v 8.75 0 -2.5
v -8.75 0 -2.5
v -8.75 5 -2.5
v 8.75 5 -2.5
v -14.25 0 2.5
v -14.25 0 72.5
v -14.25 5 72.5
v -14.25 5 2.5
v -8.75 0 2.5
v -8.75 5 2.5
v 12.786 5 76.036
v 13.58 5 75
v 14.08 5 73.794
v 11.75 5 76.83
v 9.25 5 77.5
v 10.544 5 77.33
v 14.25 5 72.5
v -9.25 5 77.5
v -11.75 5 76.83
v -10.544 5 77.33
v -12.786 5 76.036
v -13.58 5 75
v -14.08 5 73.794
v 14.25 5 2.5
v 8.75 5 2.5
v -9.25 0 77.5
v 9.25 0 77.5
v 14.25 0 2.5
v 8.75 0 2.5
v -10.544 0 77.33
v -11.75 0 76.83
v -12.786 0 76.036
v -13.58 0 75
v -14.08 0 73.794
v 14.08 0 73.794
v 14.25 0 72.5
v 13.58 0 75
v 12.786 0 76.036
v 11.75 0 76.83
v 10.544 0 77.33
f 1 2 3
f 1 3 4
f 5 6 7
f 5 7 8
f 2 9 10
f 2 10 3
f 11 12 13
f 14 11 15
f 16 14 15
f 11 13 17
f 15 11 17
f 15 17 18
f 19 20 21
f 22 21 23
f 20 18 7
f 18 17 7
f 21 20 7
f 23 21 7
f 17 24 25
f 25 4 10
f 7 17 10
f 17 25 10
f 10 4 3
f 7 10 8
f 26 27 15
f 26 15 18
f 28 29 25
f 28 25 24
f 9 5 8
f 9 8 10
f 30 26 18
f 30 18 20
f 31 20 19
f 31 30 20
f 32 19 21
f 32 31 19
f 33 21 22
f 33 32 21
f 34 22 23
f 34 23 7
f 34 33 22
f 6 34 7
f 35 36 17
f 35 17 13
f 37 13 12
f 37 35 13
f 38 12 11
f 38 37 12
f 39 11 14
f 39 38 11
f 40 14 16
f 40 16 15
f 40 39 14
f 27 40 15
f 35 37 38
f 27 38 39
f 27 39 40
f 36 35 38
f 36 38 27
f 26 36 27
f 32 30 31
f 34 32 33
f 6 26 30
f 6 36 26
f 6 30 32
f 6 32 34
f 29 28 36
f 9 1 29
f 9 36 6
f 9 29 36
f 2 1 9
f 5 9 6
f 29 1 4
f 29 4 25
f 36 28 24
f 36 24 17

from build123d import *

# Parameters (mm, degrees)
BOSS_EXTRUDE1_DEPTH = 5


with BuildPart() as part:
    # Sketch1 → Boss-Extrude1 (new body)
    with BuildSketch(Plane(origin=(0, 0, 0), x_dir=(1, 0, 0), z_dir=(0, 1, 0))):
        with BuildLine():
            Line((8.75, -2.5), (14.25, -2.5))
            Line((14.25, -2.5), (14.25, -72.5))
            ThreePointArc((14.25, -72.5), (12.785533906, -76.035533906), (9.25, -77.5))
            Line((9.25, -77.5), (-9.25, -77.5))
            ThreePointArc((-9.25, -77.5), (-12.785533906, -76.035533906), (-14.25, -72.5))
            Line((-14.25, -72.5), (-14.25, -2.5))
            Line((-14.25, -2.5), (-8.75, -2.5))
            Line((-8.75, -2.5), (-8.75, 2.5))
            Line((-8.75, 2.5), (8.75, 2.5))
            Line((8.75, 2.5), (8.75, -2.5))
        make_face()
    extrude(amount=BOSS_EXTRUDE1_DEPTH)


solid = part.part
